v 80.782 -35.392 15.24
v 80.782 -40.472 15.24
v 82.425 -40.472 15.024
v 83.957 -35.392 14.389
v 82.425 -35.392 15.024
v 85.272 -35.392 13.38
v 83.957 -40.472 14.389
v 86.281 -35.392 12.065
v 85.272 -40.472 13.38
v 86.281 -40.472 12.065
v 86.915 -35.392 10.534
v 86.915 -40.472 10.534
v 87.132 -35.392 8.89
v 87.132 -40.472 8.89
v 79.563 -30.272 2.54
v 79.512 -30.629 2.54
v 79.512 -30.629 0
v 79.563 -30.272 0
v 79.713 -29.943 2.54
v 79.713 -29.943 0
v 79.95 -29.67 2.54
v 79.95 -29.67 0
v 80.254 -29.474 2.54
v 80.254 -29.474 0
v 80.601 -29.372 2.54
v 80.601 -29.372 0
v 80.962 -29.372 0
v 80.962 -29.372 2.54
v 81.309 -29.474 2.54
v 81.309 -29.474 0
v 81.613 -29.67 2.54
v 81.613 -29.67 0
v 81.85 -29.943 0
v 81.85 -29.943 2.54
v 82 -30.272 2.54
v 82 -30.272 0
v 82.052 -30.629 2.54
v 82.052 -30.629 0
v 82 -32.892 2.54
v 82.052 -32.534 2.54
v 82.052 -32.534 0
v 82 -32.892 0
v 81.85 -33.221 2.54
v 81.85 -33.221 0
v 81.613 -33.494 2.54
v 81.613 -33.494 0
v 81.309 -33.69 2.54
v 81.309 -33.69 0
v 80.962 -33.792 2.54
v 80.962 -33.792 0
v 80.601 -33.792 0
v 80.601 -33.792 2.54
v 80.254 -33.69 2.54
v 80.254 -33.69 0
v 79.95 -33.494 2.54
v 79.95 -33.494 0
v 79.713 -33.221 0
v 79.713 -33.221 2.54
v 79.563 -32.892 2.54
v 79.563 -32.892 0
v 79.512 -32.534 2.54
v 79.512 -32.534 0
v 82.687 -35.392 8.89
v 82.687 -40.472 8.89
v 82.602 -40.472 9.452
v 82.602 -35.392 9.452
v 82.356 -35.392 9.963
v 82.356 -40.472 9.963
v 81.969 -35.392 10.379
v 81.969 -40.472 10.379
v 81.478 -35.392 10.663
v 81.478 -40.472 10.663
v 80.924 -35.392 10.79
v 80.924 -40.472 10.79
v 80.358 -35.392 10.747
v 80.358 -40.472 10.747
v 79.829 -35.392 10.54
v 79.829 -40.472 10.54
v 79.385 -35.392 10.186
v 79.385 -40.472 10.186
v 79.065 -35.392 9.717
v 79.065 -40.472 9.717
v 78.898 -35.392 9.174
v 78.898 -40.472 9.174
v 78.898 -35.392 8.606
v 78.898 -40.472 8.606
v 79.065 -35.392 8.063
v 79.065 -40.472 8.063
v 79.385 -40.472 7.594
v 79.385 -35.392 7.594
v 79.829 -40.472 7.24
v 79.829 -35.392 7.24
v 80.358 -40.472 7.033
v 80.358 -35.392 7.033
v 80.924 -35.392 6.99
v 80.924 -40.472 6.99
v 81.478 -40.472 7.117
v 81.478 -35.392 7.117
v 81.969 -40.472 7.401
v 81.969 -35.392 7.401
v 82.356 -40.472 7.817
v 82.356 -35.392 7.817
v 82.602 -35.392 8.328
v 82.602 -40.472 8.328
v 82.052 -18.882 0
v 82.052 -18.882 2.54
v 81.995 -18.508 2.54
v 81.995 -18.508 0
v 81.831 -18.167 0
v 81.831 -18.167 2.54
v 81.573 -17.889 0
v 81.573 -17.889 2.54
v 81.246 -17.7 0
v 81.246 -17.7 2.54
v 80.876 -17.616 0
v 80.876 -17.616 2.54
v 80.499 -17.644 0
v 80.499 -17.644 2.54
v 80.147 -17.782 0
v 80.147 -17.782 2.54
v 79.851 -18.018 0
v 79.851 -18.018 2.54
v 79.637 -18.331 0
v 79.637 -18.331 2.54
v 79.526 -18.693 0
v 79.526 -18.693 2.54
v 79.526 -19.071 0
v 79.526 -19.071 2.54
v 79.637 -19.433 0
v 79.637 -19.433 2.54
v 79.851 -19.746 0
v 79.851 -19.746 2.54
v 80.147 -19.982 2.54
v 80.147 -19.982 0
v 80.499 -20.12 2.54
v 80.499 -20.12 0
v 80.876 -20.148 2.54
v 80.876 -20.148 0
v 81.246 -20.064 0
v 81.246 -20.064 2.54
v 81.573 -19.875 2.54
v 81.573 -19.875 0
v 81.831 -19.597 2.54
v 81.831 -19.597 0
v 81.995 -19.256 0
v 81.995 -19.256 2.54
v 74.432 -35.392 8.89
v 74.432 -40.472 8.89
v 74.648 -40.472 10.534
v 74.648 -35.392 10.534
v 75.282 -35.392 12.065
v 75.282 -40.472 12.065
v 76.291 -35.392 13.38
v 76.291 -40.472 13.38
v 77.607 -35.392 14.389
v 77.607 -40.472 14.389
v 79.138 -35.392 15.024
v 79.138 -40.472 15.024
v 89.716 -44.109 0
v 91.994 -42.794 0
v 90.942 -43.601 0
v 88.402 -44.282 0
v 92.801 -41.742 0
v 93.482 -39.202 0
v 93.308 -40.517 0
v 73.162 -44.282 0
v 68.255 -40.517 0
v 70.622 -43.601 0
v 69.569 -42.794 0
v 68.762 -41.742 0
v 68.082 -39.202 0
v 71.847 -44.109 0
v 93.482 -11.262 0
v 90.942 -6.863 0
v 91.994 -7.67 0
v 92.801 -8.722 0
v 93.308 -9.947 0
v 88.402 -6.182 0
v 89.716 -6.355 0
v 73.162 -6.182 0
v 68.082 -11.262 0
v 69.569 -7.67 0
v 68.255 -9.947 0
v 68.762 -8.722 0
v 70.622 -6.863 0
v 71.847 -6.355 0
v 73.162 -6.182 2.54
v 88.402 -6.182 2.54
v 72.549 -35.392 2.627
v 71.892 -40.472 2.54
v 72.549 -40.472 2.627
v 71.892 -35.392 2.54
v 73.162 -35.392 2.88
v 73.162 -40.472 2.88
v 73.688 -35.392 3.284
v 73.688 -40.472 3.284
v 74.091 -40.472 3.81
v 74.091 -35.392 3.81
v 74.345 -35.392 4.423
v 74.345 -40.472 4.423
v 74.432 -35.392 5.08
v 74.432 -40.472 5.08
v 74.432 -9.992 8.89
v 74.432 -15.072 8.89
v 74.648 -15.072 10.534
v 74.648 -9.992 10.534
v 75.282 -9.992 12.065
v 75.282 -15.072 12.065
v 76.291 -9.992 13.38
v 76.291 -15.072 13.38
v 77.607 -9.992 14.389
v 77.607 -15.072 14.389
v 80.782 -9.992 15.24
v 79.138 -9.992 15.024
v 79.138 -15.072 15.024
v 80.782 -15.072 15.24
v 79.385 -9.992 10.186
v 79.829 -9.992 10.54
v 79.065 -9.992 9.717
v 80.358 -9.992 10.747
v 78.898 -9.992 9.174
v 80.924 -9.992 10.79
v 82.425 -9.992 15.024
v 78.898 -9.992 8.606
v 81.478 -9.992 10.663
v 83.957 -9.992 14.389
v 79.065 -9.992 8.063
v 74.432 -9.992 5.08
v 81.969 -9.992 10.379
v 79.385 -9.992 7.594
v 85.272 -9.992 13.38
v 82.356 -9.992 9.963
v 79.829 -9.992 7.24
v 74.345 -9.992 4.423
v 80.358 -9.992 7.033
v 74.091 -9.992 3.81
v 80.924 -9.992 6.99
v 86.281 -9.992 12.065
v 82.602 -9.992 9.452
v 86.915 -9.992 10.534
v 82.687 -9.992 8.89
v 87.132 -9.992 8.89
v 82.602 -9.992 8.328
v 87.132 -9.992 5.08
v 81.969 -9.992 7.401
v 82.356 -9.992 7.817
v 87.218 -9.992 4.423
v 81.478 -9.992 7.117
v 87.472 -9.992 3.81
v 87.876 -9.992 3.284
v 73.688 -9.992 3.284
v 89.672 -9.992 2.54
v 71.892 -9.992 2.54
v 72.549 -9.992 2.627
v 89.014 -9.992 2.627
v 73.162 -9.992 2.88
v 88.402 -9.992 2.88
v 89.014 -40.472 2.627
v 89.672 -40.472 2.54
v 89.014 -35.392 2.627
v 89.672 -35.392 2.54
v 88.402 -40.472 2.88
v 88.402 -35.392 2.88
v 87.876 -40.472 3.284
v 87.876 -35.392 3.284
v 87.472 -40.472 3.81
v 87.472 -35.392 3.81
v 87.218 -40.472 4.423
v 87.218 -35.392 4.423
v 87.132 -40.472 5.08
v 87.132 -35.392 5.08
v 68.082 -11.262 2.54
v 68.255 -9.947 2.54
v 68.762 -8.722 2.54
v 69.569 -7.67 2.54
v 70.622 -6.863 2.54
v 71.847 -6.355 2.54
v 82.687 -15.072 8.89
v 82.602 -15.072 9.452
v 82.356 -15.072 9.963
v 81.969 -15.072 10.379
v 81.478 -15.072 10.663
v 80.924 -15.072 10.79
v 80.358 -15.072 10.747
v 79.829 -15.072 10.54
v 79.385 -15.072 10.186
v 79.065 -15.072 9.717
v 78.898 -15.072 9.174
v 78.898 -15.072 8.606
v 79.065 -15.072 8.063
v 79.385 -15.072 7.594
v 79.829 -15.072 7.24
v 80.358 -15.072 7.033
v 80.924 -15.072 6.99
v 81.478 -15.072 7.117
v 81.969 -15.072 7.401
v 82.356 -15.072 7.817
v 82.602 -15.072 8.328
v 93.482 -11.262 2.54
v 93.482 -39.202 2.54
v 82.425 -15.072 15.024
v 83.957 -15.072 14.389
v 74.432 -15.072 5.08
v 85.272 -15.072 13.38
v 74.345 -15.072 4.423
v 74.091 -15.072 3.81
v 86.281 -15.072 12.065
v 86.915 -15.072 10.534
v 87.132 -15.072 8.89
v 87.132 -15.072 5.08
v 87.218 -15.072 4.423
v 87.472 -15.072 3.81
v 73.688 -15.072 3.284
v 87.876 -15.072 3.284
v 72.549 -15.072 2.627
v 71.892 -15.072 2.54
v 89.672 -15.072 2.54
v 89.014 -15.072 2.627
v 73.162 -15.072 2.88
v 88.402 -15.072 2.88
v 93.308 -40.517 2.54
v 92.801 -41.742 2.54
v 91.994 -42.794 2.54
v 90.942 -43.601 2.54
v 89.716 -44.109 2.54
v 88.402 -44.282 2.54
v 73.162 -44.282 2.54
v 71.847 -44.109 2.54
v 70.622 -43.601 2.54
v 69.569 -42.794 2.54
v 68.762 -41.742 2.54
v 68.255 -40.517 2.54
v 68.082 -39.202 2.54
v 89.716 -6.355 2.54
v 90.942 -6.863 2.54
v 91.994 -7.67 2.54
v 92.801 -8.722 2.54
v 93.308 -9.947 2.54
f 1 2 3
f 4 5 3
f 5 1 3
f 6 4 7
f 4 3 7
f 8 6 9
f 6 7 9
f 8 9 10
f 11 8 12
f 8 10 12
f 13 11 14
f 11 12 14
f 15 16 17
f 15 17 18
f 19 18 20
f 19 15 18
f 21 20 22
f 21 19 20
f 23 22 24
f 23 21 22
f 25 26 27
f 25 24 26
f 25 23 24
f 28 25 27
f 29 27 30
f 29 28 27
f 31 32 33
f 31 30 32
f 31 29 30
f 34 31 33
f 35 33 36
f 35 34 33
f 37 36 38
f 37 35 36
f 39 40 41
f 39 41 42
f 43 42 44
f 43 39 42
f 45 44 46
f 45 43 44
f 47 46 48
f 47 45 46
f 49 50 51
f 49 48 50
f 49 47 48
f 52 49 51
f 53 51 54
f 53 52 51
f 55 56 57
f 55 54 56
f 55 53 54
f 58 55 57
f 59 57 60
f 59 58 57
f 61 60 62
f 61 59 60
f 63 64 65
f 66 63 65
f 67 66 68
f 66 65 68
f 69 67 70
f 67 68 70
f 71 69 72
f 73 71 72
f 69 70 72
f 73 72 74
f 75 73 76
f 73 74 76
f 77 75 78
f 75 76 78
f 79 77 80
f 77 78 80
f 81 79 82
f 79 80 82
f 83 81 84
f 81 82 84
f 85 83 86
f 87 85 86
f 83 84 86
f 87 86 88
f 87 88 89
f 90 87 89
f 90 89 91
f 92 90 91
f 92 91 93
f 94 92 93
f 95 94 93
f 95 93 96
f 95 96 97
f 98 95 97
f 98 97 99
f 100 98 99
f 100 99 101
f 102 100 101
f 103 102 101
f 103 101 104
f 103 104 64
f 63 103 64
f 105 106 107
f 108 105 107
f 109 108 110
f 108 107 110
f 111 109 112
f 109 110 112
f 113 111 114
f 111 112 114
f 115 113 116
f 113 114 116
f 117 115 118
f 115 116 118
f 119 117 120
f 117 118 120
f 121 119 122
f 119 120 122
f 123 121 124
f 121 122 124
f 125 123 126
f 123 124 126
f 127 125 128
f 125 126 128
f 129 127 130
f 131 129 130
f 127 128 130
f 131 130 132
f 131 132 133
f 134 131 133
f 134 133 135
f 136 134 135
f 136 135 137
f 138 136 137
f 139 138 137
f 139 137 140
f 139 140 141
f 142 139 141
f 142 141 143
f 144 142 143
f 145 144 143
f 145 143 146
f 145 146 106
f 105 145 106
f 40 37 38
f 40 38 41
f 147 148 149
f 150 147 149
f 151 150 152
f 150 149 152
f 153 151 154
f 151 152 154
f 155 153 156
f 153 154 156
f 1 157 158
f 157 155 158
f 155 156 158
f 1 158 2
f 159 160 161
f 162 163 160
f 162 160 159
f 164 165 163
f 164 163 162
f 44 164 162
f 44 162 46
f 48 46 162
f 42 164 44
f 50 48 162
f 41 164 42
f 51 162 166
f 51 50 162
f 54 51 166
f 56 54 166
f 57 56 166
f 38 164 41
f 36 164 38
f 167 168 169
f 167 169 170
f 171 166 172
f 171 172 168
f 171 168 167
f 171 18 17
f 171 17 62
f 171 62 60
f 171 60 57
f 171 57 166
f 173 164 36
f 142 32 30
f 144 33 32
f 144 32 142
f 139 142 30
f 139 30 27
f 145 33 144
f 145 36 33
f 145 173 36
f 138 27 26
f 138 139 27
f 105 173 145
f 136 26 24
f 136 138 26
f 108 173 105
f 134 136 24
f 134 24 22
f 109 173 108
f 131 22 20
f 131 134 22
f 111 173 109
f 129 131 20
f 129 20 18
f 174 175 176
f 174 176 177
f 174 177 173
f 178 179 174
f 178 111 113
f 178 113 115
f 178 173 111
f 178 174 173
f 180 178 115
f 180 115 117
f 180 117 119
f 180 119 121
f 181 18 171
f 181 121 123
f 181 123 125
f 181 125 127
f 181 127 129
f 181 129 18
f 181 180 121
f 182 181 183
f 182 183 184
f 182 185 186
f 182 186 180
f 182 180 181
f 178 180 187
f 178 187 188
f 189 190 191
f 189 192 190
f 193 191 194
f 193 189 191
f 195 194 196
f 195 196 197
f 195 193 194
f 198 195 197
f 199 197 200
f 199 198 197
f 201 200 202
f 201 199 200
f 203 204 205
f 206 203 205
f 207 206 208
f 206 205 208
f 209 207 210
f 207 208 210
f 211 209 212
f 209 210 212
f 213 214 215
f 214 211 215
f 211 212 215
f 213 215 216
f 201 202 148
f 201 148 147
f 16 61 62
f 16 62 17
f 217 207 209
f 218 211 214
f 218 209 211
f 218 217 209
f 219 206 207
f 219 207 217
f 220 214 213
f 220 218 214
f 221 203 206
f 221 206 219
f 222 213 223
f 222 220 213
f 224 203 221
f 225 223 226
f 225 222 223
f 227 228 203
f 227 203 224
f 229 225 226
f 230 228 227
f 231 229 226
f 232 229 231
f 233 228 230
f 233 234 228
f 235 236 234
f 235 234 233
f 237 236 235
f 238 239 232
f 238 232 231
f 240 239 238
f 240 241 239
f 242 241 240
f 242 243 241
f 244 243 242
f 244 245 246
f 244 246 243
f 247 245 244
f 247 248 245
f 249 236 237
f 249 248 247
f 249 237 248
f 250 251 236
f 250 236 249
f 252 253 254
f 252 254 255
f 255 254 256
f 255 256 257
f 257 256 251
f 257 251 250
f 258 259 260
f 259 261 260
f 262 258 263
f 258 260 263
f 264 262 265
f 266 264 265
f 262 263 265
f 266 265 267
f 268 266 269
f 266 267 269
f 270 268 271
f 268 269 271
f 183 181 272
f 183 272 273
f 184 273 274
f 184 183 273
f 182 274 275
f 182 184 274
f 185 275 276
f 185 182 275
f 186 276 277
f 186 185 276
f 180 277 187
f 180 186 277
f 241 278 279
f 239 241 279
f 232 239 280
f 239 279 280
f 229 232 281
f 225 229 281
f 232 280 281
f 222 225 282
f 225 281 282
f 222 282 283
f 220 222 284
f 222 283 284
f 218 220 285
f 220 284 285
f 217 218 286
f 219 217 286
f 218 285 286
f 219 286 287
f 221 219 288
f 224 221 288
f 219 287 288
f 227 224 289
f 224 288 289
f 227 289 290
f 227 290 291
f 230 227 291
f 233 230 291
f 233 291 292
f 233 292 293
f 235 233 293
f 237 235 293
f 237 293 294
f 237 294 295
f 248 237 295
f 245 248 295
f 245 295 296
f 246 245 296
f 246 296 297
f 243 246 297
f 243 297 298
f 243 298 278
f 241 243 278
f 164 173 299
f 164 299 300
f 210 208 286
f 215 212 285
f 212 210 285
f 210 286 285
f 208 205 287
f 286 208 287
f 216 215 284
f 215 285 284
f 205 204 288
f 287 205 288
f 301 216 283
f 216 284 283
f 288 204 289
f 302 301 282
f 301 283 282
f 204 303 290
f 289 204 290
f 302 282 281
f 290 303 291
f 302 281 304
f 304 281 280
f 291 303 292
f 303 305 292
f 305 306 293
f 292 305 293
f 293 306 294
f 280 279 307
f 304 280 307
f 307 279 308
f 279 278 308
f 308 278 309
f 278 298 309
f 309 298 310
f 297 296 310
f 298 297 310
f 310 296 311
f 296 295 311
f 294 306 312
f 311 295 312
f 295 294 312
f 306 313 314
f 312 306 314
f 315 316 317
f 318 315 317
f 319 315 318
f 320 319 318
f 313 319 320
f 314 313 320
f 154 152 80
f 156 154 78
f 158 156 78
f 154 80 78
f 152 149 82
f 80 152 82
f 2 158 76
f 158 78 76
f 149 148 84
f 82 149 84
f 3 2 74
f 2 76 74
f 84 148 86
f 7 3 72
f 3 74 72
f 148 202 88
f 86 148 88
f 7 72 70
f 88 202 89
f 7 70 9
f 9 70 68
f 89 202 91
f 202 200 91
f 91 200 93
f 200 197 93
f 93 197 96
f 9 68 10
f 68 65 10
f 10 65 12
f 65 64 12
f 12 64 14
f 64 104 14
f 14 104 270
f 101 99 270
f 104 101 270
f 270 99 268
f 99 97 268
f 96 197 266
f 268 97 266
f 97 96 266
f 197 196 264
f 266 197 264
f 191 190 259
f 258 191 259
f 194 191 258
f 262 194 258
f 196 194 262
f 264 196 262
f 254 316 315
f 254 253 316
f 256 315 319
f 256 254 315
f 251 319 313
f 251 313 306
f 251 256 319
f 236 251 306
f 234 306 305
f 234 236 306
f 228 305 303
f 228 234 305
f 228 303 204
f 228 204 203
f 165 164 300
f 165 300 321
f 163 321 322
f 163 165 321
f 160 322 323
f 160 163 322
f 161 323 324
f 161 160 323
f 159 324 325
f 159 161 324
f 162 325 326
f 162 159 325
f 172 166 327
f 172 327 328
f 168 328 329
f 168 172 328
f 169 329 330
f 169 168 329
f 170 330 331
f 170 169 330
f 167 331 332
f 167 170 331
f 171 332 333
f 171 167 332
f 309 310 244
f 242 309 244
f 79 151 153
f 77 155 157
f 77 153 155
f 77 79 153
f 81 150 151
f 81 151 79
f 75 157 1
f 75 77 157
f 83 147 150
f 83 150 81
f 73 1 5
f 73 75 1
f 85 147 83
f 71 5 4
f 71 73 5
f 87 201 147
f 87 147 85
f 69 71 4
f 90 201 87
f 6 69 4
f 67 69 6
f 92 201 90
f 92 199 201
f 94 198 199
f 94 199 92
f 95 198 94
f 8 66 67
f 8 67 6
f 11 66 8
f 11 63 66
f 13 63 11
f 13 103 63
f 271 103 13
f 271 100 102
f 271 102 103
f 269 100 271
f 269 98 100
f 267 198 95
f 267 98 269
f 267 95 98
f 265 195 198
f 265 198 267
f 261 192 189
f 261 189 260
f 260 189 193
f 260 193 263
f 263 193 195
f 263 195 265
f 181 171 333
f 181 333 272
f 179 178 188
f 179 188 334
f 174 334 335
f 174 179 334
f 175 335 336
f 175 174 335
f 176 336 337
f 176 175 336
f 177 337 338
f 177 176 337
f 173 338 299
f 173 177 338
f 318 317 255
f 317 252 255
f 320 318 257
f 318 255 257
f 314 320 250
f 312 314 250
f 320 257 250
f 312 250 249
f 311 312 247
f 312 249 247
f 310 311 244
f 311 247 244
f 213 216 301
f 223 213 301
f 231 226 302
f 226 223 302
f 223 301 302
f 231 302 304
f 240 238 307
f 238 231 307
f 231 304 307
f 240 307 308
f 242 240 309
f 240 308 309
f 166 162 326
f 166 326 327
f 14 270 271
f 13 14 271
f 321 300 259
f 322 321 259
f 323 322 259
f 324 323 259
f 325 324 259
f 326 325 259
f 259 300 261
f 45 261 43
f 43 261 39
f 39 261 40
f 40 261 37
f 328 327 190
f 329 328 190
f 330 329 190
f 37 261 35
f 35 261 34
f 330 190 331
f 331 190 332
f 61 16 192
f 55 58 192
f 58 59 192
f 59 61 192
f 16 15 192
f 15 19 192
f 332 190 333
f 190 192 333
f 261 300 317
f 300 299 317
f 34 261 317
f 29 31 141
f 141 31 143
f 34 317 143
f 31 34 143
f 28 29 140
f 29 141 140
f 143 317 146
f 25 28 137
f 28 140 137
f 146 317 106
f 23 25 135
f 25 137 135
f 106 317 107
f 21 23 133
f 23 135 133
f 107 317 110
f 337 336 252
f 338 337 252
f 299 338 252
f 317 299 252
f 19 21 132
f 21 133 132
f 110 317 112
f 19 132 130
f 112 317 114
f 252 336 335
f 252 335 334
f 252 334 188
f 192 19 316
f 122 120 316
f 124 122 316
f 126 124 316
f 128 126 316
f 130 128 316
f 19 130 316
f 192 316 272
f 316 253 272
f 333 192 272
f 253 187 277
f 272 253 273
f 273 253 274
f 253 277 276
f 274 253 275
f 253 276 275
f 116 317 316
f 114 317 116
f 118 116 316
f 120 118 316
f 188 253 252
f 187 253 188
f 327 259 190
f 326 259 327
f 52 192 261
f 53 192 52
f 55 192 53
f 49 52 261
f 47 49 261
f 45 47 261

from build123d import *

# Parameters (mm, degrees)
BOSS_EXTRUDE1_DEPTH = 2.54
SKETCH2_W           = 12.7
SKETCH2_H           = 5.08
BOSS_EXTRUDE2_DEPTH = 12.7
CUT_EXTRUDE2_DEPTH  = 101.731669178
SKETCH4_R           = 1.905
CUT_EXTRUDE3_DEPTH  = 101.731669178
SKETCH5_R           = 1.27
CUT_EXTRUDE4_DEPTH  = 105.216075999
FILLET2_R           = 2.54


with BuildPart() as part:
    # Sketch1 → Boss-Extrude1 (new body)
    with BuildSketch(Plane.XY):
        with BuildLine():
            Line((73.161588965, -6.18197174), (88.401588965, -6.18197174))
            ThreePointArc((88.401588965, -6.18197174), (91.993691413, -7.669869292), (93.481588965, -11.26197174))
            Line((93.481588965, -11.26197174), (93.481588965, -39.20197174))
            ThreePointArc((93.481588965, -39.20197174), (91.993691413, -42.794074189), (88.401588965, -44.28197174))
            Line((88.401588965, -44.28197174), (73.161588965, -44.28197174))
            ThreePointArc((73.161588965, -44.28197174), (69.569486517, -42.794074189), (68.081588965, -39.20197174))
            Line((68.081588965, -39.20197174), (68.081588965, -11.26197174))
            ThreePointArc((68.081588965, -11.26197174), (69.569486517, -7.669869292), (73.161588965, -6.18197174))
        make_face()
    extrude(amount=BOSS_EXTRUDE1_DEPTH)

    # Sketch2 → Boss-Extrude2 (add)
    with BuildSketch(Plane.XY.offset(2.54)):
        with Locations((80.781588965, -12.53197174)):
            Rectangle(SKETCH2_W, SKETCH2_H)
        with Locations((80.781588965, -37.93197174)):
            Rectangle(SKETCH2_W, SKETCH2_H)
    extrude(amount=BOSS_EXTRUDE2_DEPTH)

    # Sketch3 → Cut-Extrude2 (cut, through all)
    with BuildSketch(Plane(origin=(0, -40.47197174, 0), x_dir=(-1, 0, 0), z_dir=(0, -1, 0))):
        with BuildLine():
            Line((-74.431588965, -15.24), (-74.431588965, -8.89))
            ThreePointArc((-74.431588965, -8.89), (-76.291460904, -13.380128061), (-80.781588965, -15.24))
            Line((-80.781588965, -15.24), (-74.431588965, -15.24))
        make_face()
        with BuildLine():
            Line((-87.131588965, -15.24), (-80.781588965, -15.24))
            ThreePointArc((-80.781588965, -15.24), (-85.271717026, -13.380128061), (-87.131588965, -8.89))
            Line((-87.131588965, -8.89), (-87.131588965, -15.24))
        make_face()
    extrude(amount=-CUT_EXTRUDE2_DEPTH, mode=Mode.SUBTRACT)

    # Sketch4 → Cut-Extrude3 (cut, through all)
    with BuildSketch(Plane.XZ.offset(40.47197174)):
        with Locations((80.781588965, 8.89)):
            Circle(SKETCH4_R)
    extrude(amount=-CUT_EXTRUDE3_DEPTH, mode=Mode.SUBTRACT)

    # Sketch5 → Cut-Extrude4 (cut, through all)
    with BuildSketch(Plane.XY.offset(2.54)):
        with Locations((80.781588965, -18.88197174)):
            Circle(SKETCH5_R)
        with BuildLine():
            Line((79.511588965, -32.53447174), (79.511588965, -30.62947174))
            ThreePointArc((79.511588965, -30.62947174), (80.781588965, -29.35947174), (82.051588965, -30.62947174))
            Line((82.051588965, -30.62947174), (82.051588965, -32.53447174))
            ThreePointArc((82.051588965, -32.53447174), (80.781588965, -33.80447174), (79.511588965, -32.53447174))
        make_face()
    extrude(amount=-CUT_EXTRUDE4_DEPTH, mode=Mode.SUBTRACT)

    # Fillet2
    fillet2_edges = [part.edges().sort_by_distance(p)[0] for p in [
        (74.431588965, -12.53197174, 2.54),
        (87.131588965, -12.53197174, 2.54),
        (87.131588965, -37.93197174, 2.54),
        (74.431588965, -37.93197174, 2.54),
    ]]
    fillet(fillet2_edges, radius=FILLET2_R)


solid = part.part
